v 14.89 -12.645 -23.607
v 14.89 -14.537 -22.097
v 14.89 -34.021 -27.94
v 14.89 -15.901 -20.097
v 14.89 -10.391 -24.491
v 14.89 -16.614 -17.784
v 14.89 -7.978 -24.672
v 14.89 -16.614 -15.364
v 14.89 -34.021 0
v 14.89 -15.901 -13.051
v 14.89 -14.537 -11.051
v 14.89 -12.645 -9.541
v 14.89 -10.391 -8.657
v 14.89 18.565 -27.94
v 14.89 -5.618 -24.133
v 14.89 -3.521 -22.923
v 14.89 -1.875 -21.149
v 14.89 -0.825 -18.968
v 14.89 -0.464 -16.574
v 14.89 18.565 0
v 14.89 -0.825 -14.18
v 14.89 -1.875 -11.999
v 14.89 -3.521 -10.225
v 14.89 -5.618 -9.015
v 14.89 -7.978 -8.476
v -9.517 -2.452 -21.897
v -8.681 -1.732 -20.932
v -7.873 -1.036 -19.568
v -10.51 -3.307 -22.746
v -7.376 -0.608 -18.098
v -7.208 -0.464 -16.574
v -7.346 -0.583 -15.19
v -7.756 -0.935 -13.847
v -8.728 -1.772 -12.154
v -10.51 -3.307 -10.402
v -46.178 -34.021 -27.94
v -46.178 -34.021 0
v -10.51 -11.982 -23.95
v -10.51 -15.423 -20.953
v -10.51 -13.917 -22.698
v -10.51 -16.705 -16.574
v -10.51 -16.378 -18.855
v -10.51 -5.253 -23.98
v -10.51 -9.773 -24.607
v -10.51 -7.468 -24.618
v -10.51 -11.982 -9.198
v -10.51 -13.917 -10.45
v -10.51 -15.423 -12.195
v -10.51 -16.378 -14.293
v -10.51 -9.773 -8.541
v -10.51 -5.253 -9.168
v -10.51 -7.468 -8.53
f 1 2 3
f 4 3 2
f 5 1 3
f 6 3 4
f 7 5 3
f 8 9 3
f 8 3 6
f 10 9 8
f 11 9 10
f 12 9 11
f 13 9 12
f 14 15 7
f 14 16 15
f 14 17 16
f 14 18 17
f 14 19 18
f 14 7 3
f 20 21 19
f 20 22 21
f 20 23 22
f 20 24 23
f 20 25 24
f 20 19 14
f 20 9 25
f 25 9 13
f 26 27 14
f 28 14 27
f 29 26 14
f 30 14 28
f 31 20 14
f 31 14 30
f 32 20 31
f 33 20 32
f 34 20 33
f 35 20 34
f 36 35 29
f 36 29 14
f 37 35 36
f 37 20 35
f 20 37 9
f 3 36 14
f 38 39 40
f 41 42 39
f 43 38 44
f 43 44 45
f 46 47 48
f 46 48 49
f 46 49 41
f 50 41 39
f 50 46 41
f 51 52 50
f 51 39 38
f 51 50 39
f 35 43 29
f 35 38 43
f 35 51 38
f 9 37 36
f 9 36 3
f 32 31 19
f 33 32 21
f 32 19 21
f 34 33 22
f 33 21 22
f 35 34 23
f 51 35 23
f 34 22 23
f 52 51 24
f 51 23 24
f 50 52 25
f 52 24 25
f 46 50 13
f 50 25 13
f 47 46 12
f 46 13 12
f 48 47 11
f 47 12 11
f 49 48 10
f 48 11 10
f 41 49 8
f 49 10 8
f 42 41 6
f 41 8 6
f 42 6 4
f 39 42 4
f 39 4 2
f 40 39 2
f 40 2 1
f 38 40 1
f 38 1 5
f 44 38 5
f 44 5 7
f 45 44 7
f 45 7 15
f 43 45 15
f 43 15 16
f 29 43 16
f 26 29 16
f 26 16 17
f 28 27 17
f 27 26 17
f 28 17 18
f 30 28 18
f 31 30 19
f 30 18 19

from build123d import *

# Parameters (mm, degrees)
F1_DEPTH = 27.94
F2_R     = 8.120671
F3_DEPTH = 25.4


with BuildPart() as f1:
    # F0 (on Top) → F1 (new body)
    with BuildSketch(Plane.XY):
        Polygon((14.889965, 18.565336), (-46.177741, -34.020744), (14.889965, -34.020744), align=None)
    extrude(amount=-F1_DEPTH)

    # F2 (on face) → F3 (cut)
    with BuildSketch(Plane.YZ.offset(14.889965)):
        with Locations((-8.584474, -16.574016)):
            Circle(F2_R)
    extrude(amount=-F3_DEPTH, mode=Mode.SUBTRACT)


solid = f1.part
